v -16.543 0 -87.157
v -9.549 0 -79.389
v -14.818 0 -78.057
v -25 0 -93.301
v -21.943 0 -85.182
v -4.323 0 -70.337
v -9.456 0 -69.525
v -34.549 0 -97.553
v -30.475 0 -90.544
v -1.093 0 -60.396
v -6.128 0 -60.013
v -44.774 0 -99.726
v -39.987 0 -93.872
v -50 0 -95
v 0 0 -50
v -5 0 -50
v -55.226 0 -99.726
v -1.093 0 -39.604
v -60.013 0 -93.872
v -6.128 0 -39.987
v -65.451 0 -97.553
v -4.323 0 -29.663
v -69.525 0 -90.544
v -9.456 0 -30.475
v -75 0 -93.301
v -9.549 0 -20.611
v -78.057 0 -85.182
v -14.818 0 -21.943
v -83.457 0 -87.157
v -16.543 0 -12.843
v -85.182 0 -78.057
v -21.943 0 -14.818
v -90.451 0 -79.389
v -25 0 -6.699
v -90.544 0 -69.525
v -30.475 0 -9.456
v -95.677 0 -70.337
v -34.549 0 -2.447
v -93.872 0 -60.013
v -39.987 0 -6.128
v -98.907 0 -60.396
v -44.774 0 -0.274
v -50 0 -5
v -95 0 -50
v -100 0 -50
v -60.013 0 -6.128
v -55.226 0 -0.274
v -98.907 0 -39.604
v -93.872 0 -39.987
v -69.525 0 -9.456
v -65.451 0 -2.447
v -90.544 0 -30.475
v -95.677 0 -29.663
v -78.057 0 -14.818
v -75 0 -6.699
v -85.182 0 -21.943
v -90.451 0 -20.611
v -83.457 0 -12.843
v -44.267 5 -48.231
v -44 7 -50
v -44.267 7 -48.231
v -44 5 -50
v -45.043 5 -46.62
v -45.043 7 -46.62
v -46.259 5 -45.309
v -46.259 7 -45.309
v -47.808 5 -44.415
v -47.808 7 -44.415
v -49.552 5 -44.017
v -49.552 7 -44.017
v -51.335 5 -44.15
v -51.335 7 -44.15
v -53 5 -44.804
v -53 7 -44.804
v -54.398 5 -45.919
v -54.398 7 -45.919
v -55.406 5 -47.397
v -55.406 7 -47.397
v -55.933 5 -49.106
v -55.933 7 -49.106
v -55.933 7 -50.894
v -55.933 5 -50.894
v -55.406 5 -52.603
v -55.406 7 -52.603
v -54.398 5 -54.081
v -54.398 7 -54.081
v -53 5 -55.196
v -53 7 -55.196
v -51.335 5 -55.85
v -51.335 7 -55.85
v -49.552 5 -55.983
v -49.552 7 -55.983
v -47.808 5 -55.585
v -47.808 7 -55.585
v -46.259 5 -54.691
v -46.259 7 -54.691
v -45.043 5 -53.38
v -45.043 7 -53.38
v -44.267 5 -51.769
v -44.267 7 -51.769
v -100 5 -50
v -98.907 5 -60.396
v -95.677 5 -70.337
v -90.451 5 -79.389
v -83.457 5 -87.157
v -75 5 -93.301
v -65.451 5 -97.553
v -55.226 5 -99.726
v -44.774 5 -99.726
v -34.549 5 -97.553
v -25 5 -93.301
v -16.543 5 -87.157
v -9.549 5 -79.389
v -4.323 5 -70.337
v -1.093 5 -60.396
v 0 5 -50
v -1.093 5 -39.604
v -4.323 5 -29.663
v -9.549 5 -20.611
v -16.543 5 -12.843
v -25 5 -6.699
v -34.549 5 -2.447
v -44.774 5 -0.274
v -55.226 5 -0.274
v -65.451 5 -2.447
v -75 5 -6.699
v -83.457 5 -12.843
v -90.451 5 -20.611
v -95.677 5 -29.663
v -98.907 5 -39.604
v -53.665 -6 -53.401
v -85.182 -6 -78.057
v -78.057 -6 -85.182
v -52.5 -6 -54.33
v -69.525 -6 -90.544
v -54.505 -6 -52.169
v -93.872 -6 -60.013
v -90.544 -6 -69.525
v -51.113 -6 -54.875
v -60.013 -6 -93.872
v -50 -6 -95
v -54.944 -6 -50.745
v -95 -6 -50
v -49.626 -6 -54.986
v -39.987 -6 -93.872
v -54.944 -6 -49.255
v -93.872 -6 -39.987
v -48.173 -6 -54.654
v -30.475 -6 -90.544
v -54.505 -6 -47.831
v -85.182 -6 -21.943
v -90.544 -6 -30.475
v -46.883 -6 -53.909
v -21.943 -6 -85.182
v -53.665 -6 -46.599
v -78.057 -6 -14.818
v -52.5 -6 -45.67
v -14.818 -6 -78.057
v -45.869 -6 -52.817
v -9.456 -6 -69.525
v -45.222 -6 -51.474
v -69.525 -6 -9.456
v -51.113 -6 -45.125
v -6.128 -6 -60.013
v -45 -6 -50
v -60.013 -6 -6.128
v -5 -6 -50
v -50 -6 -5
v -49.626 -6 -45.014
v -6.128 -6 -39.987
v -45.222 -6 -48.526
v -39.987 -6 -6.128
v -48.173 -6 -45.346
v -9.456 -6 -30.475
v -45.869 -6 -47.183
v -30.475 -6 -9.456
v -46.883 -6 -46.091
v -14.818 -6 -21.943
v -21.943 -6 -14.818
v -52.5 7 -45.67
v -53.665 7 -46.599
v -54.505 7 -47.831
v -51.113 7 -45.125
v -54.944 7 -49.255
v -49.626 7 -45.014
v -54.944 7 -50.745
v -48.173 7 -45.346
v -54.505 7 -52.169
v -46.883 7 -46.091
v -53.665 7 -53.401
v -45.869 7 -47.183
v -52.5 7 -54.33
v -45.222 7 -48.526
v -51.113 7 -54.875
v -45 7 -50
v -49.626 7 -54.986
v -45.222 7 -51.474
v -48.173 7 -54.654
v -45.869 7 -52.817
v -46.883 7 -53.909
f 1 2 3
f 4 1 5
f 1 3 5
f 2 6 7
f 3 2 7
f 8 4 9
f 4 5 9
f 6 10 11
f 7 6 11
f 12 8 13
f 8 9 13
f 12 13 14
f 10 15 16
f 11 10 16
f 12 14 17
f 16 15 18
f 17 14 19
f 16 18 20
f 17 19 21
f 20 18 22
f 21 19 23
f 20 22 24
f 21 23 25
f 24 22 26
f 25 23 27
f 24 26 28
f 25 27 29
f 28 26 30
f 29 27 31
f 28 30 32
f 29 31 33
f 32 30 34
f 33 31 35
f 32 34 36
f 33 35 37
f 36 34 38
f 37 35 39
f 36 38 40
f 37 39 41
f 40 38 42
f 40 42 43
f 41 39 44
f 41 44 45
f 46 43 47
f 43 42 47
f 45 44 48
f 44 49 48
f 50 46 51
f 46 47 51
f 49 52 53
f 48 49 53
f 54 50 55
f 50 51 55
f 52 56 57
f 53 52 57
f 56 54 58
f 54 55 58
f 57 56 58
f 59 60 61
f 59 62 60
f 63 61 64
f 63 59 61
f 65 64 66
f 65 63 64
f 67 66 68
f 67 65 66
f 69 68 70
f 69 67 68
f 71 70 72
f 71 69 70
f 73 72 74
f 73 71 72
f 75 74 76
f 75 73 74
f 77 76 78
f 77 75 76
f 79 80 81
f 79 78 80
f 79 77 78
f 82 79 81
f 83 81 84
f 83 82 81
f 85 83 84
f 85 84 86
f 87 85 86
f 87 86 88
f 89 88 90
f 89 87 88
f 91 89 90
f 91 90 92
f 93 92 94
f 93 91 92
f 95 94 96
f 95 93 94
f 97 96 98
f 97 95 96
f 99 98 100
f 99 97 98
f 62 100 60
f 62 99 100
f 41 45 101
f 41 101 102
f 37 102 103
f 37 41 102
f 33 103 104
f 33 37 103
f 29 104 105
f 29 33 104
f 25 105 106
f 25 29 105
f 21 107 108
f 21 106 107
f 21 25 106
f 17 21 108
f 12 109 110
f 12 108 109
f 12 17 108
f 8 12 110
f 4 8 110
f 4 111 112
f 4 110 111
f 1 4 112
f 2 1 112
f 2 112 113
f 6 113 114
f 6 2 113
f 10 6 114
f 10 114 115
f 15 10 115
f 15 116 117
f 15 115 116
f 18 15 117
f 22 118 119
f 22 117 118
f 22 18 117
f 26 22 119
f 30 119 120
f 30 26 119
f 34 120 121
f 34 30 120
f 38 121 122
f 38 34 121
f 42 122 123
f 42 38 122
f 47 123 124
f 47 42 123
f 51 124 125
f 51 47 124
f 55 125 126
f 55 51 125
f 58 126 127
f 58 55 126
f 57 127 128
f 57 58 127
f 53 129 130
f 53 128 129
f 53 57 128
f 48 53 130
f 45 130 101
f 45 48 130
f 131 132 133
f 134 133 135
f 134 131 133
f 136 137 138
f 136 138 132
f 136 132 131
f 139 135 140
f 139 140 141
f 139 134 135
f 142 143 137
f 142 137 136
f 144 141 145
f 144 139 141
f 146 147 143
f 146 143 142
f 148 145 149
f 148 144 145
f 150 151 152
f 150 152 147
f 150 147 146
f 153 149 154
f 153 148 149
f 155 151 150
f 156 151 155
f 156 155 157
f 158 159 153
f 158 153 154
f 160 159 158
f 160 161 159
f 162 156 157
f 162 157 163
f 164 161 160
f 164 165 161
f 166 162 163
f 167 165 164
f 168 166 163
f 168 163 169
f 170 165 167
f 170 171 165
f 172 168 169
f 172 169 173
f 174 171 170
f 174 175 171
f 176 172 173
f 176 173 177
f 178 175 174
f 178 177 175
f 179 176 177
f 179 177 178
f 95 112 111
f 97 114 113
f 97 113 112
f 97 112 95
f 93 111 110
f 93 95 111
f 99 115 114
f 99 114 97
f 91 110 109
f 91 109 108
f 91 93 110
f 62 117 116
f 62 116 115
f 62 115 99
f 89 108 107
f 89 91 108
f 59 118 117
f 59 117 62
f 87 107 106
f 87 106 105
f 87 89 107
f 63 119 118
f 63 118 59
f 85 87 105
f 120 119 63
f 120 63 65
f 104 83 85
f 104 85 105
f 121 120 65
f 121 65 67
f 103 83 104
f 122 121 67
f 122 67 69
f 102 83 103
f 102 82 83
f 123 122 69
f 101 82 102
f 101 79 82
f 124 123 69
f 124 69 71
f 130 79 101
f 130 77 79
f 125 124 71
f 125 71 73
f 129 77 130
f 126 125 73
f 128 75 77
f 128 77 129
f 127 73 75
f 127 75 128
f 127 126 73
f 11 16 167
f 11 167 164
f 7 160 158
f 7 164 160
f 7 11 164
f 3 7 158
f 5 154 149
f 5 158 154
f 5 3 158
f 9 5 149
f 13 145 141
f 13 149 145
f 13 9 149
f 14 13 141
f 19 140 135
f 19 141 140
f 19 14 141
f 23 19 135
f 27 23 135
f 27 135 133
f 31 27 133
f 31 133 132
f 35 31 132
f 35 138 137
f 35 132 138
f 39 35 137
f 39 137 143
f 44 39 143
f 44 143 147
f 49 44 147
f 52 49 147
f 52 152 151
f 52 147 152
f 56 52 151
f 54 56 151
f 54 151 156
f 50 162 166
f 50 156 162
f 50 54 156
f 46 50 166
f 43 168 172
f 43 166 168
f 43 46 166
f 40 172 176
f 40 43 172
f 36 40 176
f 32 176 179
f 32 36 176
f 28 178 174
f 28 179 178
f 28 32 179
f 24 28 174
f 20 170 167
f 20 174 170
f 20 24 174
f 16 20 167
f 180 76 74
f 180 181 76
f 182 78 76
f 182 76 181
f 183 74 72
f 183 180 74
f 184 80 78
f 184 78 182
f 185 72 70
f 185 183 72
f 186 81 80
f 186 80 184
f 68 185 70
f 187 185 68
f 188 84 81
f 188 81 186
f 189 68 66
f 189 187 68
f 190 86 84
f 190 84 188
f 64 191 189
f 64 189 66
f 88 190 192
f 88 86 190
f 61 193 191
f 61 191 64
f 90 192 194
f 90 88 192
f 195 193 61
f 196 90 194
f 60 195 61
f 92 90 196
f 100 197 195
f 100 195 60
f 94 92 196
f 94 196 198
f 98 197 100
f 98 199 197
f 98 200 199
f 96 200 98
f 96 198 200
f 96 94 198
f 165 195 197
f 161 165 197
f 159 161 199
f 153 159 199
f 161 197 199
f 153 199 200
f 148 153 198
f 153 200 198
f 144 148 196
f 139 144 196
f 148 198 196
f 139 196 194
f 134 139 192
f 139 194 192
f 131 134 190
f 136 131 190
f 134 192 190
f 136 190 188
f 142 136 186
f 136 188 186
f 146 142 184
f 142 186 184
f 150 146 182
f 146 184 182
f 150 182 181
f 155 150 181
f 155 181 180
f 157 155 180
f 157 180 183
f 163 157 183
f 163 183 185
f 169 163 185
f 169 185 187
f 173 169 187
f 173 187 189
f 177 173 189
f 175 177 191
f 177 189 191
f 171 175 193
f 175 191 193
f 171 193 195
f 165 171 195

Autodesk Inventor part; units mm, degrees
ref_plane "YZ Plane" through (0, 0, 0) normal (1, 0, 0) x (0, 1, 0)
ref_plane "XZ Plane" through (0, 0, 0) normal (0, 1, 0) x (-1, 0, 0)
ref_plane "XY Plane" through (0, 0, 0) normal (0, 0, 1) x (1, 0, 0)
sketch "Boceto1" plane through (0, 0, 0) normal (0, 1, 0) x (-1, 0, 0)
  line L0 (0, 0) -> (100, 0) construction
  line L1 (100, 0) -> (100, -100) construction
  line L2 (100, -100) -> (0, -100) construction
  line L3 (0, -100) -> (0, 0) construction
  line L4 (100, -100) -> (0, 0) construction
  line L5 (100, 0) -> (0, -100) construction
  circle A0 centre (50, -50) radius 50
  dimension "d0" = 100
  dimension "d1" = 100
  dimension "d2" = 100
extrude "Extrusión1" add sketch "Boceto1" along normal blind 5
sketch "Boceto2" plane through (-50, 0, -50) normal (0, -1, 0) x (1, 0, 0)
  circle A0 centre (0, 0) radius 45
  point P0 (50, 50)
  dimension "d5" = 90
extrude "Extrusión2" add sketch "Boceto2" along normal blind 6
thread "Rosca1" size "M80x1.5" class "6g" standard "ANSI Metric M Profile" length 6
sketch "Boceto3" plane through (-50, 5, -50) normal (0, 1, 0) x (1, 0, 0)
  circle A0 centre (0, 0) radius 6
  point P0 (50, -50)
  dimension "d10" = 12
extrude "Extrusión3" add sketch "Boceto3" along normal blind 2
sketch "Boceto4" plane through (-50, 7, -50) normal (0, 1, 0) x (1, 0, 0)
  circle A0 centre (0, 0) radius 5
  point P0 (50, -50)
  dimension "d13" = 10
extrude "Extrusión4" cut sketch "Boceto4" against normal through all
thread "Rosca2" size "M9x1.25" class "6H" standard "ANSI Metric M Profile" full length
